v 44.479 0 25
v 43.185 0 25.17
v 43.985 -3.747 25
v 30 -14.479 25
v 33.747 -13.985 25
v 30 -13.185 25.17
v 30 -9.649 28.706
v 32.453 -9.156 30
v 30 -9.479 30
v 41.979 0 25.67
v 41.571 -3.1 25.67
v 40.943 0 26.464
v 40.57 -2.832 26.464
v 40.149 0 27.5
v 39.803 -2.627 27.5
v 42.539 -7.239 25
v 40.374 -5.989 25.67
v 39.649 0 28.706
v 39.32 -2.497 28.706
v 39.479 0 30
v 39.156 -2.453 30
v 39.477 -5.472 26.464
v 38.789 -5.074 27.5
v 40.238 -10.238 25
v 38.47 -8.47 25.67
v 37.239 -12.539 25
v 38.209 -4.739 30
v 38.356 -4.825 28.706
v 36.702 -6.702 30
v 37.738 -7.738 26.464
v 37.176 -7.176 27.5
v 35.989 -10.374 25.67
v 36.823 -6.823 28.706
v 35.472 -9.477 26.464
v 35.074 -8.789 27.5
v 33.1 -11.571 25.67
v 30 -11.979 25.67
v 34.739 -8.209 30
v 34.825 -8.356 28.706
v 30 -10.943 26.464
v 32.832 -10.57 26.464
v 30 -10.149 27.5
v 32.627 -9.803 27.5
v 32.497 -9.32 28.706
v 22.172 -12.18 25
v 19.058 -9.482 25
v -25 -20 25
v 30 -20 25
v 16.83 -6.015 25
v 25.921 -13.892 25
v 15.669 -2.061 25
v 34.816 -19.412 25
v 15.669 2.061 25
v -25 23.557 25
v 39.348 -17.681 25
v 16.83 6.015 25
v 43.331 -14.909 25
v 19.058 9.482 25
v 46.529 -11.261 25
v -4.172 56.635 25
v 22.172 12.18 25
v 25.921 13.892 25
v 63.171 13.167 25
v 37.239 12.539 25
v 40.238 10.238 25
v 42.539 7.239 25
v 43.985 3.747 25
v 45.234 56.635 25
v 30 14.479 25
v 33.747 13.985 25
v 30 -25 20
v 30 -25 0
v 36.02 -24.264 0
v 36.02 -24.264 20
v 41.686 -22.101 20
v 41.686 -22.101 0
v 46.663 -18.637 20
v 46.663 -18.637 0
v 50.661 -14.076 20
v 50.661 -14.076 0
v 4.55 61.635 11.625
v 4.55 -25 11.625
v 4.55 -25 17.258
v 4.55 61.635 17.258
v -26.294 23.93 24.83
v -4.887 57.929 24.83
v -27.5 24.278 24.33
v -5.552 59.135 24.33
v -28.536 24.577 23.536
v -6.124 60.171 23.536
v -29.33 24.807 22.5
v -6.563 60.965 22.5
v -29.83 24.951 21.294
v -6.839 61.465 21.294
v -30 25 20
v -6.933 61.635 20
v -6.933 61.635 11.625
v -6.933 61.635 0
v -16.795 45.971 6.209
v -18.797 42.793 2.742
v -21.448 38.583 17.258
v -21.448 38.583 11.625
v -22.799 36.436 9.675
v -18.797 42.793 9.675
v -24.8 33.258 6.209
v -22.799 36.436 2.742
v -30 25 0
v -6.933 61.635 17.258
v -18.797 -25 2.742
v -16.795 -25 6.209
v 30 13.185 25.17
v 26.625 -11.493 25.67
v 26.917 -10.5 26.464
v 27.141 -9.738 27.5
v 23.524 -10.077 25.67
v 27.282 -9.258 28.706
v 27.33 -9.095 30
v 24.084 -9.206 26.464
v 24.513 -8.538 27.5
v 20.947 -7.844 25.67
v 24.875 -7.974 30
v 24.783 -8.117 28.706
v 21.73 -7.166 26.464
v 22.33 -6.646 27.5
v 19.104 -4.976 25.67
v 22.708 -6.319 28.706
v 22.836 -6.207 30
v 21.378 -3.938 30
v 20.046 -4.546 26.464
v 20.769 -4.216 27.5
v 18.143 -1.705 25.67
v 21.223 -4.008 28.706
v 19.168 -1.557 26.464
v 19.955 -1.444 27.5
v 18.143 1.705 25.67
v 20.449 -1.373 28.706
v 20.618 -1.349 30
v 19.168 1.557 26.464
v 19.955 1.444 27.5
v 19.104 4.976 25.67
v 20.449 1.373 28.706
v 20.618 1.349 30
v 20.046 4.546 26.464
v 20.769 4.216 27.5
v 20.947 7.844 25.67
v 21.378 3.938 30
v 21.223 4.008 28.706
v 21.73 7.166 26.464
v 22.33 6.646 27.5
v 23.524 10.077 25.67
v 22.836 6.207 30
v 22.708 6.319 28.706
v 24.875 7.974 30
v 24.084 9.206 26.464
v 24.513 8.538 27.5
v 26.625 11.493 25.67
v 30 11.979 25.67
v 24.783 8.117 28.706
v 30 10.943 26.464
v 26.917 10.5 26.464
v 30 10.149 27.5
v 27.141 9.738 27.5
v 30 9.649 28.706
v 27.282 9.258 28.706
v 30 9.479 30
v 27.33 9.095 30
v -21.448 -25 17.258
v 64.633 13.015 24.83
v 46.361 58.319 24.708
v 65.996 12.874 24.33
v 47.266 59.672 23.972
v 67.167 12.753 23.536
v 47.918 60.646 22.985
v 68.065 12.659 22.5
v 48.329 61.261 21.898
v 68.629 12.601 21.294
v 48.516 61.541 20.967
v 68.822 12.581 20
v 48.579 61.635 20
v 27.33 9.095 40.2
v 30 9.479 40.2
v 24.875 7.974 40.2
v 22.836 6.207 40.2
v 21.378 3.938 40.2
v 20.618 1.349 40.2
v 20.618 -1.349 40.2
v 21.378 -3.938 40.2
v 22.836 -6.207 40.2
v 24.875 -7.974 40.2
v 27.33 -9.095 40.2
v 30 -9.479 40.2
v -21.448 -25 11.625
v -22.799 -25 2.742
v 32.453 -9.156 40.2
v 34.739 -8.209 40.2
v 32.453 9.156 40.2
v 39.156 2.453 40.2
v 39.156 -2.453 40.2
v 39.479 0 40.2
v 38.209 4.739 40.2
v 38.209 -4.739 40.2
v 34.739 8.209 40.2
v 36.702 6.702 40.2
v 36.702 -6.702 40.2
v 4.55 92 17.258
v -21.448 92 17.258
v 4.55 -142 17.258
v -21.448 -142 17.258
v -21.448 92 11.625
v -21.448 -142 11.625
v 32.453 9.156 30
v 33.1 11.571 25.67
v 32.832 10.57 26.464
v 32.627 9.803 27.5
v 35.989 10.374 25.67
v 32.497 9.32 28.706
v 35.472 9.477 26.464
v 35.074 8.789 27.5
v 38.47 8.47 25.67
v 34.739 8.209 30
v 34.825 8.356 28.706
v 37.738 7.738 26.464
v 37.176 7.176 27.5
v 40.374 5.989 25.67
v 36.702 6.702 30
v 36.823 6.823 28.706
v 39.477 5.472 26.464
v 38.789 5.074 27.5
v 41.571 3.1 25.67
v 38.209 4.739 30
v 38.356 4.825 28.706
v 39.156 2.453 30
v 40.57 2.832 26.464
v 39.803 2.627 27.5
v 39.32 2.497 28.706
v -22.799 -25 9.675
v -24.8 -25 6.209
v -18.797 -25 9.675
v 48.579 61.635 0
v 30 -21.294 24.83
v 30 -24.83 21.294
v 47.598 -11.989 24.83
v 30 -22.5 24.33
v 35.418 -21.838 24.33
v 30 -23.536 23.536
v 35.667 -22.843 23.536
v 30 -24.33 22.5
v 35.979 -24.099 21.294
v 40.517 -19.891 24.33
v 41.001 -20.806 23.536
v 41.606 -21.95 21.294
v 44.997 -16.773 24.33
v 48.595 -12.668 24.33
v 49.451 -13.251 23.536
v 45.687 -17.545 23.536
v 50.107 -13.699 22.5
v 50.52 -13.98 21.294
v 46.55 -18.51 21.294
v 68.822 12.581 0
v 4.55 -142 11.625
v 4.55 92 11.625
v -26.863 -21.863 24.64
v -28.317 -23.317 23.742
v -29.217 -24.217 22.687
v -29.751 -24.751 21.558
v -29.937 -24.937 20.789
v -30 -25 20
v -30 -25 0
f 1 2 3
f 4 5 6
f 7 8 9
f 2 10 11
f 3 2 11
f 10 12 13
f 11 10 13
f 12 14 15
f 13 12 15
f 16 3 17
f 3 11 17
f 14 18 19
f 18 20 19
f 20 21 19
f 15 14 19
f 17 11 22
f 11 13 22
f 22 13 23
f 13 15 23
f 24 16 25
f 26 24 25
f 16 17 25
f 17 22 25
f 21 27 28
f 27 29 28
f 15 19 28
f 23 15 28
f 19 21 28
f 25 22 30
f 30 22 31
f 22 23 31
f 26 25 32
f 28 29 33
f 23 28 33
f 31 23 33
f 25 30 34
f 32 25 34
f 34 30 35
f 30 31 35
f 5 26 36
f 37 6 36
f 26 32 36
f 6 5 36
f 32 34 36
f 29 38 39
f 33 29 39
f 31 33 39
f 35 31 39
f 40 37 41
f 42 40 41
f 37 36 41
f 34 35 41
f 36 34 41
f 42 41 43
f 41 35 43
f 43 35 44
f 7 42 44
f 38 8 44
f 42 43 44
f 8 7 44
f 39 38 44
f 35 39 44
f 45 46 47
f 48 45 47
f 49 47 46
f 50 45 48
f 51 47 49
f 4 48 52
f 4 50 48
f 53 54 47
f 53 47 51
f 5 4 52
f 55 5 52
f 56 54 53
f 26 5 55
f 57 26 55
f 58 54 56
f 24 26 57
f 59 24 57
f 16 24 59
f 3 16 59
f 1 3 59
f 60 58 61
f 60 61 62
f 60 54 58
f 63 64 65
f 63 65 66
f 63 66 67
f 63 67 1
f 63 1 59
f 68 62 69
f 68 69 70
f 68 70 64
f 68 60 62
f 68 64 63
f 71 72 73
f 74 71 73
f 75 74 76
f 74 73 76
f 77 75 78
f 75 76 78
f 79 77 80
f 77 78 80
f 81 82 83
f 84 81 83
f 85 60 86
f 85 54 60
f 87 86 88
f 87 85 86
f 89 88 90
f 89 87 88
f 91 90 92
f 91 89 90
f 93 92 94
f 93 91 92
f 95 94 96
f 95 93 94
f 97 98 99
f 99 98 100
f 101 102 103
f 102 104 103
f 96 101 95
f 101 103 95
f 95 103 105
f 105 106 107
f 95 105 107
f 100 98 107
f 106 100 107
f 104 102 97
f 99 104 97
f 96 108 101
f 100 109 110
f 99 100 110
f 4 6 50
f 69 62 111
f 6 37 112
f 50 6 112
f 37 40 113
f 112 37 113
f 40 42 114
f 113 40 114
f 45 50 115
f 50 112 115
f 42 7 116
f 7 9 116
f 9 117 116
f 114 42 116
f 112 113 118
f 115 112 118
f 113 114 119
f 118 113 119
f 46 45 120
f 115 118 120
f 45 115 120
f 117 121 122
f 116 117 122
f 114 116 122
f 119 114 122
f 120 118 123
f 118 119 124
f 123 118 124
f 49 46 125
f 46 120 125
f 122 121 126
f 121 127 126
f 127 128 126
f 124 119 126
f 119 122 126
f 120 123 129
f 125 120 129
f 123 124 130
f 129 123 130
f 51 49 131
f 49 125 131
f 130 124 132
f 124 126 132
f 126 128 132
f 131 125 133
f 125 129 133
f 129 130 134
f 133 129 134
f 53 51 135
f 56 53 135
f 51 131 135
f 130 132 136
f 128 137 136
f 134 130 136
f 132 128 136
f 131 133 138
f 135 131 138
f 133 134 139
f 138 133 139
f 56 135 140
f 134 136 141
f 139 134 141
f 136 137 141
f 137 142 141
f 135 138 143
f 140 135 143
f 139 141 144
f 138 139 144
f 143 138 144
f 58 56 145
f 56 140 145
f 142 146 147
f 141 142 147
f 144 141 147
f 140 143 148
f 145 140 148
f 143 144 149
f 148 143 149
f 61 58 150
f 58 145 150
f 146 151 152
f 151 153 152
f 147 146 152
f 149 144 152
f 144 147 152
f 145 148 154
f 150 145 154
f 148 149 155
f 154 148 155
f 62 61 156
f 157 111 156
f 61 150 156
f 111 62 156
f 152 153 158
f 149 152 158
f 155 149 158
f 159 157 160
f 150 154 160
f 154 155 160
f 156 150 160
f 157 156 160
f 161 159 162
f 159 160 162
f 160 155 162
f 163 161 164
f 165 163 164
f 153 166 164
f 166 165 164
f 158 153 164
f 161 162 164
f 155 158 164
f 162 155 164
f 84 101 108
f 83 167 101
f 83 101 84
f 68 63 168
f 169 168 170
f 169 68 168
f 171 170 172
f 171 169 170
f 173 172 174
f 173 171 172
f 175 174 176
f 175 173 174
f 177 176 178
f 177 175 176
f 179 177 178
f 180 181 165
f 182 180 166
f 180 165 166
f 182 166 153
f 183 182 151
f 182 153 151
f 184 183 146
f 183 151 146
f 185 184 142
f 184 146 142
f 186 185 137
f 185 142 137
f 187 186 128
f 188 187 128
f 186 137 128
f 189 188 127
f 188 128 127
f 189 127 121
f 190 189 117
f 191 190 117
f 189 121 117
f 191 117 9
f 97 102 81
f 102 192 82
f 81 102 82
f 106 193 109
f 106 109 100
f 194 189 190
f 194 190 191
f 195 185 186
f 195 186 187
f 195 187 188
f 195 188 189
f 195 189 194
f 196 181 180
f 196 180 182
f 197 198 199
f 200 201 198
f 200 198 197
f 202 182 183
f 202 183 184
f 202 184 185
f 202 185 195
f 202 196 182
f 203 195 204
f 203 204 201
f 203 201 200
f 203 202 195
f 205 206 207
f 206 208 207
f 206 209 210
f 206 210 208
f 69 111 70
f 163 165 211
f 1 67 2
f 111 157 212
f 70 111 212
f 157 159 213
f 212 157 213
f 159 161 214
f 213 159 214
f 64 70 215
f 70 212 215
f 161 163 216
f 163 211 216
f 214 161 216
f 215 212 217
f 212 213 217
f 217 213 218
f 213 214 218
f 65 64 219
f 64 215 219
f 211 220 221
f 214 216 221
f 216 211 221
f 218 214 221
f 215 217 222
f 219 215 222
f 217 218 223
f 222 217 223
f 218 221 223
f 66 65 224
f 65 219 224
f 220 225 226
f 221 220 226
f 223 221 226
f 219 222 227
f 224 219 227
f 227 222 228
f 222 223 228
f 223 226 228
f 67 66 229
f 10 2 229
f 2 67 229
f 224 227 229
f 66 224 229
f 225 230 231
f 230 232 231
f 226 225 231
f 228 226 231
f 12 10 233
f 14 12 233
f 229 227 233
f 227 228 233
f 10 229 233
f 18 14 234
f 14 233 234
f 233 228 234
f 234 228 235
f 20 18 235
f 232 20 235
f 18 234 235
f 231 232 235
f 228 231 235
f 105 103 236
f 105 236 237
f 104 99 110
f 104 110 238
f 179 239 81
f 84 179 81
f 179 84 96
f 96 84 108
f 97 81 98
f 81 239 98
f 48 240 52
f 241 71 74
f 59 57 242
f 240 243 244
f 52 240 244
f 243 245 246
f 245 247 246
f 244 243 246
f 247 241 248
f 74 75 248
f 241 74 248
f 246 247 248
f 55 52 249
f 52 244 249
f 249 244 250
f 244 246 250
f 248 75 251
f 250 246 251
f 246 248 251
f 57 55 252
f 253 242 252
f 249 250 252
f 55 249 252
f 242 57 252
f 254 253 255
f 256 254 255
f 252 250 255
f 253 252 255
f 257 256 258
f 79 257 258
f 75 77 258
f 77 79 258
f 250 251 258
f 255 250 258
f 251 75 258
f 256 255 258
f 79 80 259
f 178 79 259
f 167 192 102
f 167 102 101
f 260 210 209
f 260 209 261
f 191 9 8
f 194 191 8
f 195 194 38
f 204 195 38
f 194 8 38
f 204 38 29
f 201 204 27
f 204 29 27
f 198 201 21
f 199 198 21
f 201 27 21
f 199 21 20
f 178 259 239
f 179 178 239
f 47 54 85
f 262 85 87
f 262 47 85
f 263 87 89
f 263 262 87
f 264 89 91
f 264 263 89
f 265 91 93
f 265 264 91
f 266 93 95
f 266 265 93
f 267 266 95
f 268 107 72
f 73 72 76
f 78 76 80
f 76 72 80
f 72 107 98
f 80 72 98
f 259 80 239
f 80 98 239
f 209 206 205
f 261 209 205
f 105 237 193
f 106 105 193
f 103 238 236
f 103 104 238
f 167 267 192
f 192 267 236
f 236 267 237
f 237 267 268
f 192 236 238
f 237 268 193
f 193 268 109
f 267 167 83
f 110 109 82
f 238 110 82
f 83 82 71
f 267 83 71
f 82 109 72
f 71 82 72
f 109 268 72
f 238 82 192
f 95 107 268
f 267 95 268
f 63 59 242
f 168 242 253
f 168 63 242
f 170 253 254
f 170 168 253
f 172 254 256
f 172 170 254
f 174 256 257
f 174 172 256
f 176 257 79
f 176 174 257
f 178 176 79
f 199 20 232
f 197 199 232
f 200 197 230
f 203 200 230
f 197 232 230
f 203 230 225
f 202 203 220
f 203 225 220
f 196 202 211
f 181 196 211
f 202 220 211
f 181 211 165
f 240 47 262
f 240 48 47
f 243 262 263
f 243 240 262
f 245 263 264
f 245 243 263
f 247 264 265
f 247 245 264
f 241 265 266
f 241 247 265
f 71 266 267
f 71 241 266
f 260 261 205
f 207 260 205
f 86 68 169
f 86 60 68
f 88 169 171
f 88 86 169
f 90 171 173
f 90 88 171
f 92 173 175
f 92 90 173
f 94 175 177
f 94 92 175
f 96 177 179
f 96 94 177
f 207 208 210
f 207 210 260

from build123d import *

# Parameters (mm, degrees)
F1_DEPTH = 25
F2_DEPTH = 40.2
F3_R     = 5
F4_W     = 25.9972466156
F4_H     = 5.6327376515
F5_DEPTH = 86.6361440549
F6_DEPTH = 117


with BuildPart() as f1:
    # F0 (on Top) → F1 (new body)
    with BuildSketch(Plane.XY):
        with BuildLine():
            Line((-30, -25), (30, -25))
            ThreePointArc((30, -25), (5, 0), (30, 25))
            Line((30, 25), (-30, 25))
            Line((-30, 25), (-30, -25))
        make_face()
        with BuildLine():
            Line((-30, 25), (30, 25))
            ThreePointArc((30, 25), (47.6776695297, 17.6776695297), (55, 0))
            ThreePointArc((55, 0), (53.8905940542, -7.364748179), (50.6608387408, -14.0758567244))
            Line((50.6608387408, -14.0758567244), (68.8215934889, 12.5808813065))
            Line((68.8215934889, 12.5808813065), (48.5793736348, 61.6351440549))
            Line((48.5793736348, 61.6351440549), (-6.9325999357, 61.6351440549))
            Line((-6.9325999357, 61.6351440549), (-30, 25))
        make_face()
        with BuildLine():
            Line((30, -9.4787223474), (30, -25))
            ThreePointArc((30, -25), (41.6855376832, -22.1008644413), (50.6608387408, -14.0758567244))
            ThreePointArc((50.6608387408, -14.0758567244), (53.8905940542, -7.364748179), (55, 0))
            ThreePointArc((55, 0), (47.6776695297, 17.6776695297), (30, 25))
            Line((30, 25), (30, 9.4787223474))
            ThreePointArc((30, 9.4787223474), (36.7024688488, 6.7024688488), (39.4787223474, 0))
            ThreePointArc((39.4787223474, 0), (36.7024688488, -6.7024688488), (30, -9.4787223474))
        make_face()
        with BuildLine():
            ThreePointArc((30, 25), (5, 0), (30, -25))
            Line((30, -25), (30, -9.4787223474))
            ThreePointArc((30, -9.4787223474), (20.5212776526, 0), (30, 9.4787223474))
            Line((30, 9.4787223474), (30, 25))
        make_face()
    extrude(amount=F1_DEPTH)

    # F0 (on Top) → F2 (join)
    with BuildSketch(Plane.XY):
        with BuildLine():
            Line((30, 9.4787223474), (30, -9.4787223474))
            ThreePointArc((30, -9.4787223474), (36.7024688488, -6.7024688488), (39.4787223474, 0))
            ThreePointArc((39.4787223474, 0), (36.7024688488, 6.7024688488), (30, 9.4787223474))
        make_face()
        with BuildLine():
            ThreePointArc((30, 9.4787223474), (20.5212776526, 0), (30, -9.4787223474))
            Line((30, -9.4787223474), (30, 9.4787223474))
        make_face()
    extrude(amount=F2_DEPTH)

    # F3
    f3_edges = [f1.edges().sort_by_distance(p)[0] for p in [
        (0, -25, 25),
        (-30, 0, 25),
        (-18.4663, 43.317572, 25),
        (20.823387, 61.635144, 25),
        (58.700484, 37.108013, 25),
        (20.521278, 0, 25),
    ]]
    fillet(f3_edges, radius=F3_R)

    # F4 (on face) → F5 (cut, through all)
    with BuildSketch(Plane.XZ.offset(25)):
        Polygon((-22.799067764, 2.7424353175), (-18.7965290561, 2.7424353175), (-16.7952597022, 6.2087355182), (-18.7965290561, 9.6750357188), (-22.799067764, 9.6750357188), (-24.800337118, 6.2087355182), align=None)
        with Locations((-8.4491046146, 14.4411977381)):
            Rectangle(F4_W, F4_H)
    extrude(amount=-F5_DEPTH, mode=Mode.SUBTRACT)


with BuildPart() as f6:
    # F4 (on face) → F6 (new body, symmetric)
    with BuildSketch(Plane.XZ.offset(25)):
        with Locations((-8.4491046146, 14.4411977381)):
            Rectangle(F4_W, F4_H)
    extrude(amount=F6_DEPTH, both=True)


solid = Compound([f1.part, f6.part])
